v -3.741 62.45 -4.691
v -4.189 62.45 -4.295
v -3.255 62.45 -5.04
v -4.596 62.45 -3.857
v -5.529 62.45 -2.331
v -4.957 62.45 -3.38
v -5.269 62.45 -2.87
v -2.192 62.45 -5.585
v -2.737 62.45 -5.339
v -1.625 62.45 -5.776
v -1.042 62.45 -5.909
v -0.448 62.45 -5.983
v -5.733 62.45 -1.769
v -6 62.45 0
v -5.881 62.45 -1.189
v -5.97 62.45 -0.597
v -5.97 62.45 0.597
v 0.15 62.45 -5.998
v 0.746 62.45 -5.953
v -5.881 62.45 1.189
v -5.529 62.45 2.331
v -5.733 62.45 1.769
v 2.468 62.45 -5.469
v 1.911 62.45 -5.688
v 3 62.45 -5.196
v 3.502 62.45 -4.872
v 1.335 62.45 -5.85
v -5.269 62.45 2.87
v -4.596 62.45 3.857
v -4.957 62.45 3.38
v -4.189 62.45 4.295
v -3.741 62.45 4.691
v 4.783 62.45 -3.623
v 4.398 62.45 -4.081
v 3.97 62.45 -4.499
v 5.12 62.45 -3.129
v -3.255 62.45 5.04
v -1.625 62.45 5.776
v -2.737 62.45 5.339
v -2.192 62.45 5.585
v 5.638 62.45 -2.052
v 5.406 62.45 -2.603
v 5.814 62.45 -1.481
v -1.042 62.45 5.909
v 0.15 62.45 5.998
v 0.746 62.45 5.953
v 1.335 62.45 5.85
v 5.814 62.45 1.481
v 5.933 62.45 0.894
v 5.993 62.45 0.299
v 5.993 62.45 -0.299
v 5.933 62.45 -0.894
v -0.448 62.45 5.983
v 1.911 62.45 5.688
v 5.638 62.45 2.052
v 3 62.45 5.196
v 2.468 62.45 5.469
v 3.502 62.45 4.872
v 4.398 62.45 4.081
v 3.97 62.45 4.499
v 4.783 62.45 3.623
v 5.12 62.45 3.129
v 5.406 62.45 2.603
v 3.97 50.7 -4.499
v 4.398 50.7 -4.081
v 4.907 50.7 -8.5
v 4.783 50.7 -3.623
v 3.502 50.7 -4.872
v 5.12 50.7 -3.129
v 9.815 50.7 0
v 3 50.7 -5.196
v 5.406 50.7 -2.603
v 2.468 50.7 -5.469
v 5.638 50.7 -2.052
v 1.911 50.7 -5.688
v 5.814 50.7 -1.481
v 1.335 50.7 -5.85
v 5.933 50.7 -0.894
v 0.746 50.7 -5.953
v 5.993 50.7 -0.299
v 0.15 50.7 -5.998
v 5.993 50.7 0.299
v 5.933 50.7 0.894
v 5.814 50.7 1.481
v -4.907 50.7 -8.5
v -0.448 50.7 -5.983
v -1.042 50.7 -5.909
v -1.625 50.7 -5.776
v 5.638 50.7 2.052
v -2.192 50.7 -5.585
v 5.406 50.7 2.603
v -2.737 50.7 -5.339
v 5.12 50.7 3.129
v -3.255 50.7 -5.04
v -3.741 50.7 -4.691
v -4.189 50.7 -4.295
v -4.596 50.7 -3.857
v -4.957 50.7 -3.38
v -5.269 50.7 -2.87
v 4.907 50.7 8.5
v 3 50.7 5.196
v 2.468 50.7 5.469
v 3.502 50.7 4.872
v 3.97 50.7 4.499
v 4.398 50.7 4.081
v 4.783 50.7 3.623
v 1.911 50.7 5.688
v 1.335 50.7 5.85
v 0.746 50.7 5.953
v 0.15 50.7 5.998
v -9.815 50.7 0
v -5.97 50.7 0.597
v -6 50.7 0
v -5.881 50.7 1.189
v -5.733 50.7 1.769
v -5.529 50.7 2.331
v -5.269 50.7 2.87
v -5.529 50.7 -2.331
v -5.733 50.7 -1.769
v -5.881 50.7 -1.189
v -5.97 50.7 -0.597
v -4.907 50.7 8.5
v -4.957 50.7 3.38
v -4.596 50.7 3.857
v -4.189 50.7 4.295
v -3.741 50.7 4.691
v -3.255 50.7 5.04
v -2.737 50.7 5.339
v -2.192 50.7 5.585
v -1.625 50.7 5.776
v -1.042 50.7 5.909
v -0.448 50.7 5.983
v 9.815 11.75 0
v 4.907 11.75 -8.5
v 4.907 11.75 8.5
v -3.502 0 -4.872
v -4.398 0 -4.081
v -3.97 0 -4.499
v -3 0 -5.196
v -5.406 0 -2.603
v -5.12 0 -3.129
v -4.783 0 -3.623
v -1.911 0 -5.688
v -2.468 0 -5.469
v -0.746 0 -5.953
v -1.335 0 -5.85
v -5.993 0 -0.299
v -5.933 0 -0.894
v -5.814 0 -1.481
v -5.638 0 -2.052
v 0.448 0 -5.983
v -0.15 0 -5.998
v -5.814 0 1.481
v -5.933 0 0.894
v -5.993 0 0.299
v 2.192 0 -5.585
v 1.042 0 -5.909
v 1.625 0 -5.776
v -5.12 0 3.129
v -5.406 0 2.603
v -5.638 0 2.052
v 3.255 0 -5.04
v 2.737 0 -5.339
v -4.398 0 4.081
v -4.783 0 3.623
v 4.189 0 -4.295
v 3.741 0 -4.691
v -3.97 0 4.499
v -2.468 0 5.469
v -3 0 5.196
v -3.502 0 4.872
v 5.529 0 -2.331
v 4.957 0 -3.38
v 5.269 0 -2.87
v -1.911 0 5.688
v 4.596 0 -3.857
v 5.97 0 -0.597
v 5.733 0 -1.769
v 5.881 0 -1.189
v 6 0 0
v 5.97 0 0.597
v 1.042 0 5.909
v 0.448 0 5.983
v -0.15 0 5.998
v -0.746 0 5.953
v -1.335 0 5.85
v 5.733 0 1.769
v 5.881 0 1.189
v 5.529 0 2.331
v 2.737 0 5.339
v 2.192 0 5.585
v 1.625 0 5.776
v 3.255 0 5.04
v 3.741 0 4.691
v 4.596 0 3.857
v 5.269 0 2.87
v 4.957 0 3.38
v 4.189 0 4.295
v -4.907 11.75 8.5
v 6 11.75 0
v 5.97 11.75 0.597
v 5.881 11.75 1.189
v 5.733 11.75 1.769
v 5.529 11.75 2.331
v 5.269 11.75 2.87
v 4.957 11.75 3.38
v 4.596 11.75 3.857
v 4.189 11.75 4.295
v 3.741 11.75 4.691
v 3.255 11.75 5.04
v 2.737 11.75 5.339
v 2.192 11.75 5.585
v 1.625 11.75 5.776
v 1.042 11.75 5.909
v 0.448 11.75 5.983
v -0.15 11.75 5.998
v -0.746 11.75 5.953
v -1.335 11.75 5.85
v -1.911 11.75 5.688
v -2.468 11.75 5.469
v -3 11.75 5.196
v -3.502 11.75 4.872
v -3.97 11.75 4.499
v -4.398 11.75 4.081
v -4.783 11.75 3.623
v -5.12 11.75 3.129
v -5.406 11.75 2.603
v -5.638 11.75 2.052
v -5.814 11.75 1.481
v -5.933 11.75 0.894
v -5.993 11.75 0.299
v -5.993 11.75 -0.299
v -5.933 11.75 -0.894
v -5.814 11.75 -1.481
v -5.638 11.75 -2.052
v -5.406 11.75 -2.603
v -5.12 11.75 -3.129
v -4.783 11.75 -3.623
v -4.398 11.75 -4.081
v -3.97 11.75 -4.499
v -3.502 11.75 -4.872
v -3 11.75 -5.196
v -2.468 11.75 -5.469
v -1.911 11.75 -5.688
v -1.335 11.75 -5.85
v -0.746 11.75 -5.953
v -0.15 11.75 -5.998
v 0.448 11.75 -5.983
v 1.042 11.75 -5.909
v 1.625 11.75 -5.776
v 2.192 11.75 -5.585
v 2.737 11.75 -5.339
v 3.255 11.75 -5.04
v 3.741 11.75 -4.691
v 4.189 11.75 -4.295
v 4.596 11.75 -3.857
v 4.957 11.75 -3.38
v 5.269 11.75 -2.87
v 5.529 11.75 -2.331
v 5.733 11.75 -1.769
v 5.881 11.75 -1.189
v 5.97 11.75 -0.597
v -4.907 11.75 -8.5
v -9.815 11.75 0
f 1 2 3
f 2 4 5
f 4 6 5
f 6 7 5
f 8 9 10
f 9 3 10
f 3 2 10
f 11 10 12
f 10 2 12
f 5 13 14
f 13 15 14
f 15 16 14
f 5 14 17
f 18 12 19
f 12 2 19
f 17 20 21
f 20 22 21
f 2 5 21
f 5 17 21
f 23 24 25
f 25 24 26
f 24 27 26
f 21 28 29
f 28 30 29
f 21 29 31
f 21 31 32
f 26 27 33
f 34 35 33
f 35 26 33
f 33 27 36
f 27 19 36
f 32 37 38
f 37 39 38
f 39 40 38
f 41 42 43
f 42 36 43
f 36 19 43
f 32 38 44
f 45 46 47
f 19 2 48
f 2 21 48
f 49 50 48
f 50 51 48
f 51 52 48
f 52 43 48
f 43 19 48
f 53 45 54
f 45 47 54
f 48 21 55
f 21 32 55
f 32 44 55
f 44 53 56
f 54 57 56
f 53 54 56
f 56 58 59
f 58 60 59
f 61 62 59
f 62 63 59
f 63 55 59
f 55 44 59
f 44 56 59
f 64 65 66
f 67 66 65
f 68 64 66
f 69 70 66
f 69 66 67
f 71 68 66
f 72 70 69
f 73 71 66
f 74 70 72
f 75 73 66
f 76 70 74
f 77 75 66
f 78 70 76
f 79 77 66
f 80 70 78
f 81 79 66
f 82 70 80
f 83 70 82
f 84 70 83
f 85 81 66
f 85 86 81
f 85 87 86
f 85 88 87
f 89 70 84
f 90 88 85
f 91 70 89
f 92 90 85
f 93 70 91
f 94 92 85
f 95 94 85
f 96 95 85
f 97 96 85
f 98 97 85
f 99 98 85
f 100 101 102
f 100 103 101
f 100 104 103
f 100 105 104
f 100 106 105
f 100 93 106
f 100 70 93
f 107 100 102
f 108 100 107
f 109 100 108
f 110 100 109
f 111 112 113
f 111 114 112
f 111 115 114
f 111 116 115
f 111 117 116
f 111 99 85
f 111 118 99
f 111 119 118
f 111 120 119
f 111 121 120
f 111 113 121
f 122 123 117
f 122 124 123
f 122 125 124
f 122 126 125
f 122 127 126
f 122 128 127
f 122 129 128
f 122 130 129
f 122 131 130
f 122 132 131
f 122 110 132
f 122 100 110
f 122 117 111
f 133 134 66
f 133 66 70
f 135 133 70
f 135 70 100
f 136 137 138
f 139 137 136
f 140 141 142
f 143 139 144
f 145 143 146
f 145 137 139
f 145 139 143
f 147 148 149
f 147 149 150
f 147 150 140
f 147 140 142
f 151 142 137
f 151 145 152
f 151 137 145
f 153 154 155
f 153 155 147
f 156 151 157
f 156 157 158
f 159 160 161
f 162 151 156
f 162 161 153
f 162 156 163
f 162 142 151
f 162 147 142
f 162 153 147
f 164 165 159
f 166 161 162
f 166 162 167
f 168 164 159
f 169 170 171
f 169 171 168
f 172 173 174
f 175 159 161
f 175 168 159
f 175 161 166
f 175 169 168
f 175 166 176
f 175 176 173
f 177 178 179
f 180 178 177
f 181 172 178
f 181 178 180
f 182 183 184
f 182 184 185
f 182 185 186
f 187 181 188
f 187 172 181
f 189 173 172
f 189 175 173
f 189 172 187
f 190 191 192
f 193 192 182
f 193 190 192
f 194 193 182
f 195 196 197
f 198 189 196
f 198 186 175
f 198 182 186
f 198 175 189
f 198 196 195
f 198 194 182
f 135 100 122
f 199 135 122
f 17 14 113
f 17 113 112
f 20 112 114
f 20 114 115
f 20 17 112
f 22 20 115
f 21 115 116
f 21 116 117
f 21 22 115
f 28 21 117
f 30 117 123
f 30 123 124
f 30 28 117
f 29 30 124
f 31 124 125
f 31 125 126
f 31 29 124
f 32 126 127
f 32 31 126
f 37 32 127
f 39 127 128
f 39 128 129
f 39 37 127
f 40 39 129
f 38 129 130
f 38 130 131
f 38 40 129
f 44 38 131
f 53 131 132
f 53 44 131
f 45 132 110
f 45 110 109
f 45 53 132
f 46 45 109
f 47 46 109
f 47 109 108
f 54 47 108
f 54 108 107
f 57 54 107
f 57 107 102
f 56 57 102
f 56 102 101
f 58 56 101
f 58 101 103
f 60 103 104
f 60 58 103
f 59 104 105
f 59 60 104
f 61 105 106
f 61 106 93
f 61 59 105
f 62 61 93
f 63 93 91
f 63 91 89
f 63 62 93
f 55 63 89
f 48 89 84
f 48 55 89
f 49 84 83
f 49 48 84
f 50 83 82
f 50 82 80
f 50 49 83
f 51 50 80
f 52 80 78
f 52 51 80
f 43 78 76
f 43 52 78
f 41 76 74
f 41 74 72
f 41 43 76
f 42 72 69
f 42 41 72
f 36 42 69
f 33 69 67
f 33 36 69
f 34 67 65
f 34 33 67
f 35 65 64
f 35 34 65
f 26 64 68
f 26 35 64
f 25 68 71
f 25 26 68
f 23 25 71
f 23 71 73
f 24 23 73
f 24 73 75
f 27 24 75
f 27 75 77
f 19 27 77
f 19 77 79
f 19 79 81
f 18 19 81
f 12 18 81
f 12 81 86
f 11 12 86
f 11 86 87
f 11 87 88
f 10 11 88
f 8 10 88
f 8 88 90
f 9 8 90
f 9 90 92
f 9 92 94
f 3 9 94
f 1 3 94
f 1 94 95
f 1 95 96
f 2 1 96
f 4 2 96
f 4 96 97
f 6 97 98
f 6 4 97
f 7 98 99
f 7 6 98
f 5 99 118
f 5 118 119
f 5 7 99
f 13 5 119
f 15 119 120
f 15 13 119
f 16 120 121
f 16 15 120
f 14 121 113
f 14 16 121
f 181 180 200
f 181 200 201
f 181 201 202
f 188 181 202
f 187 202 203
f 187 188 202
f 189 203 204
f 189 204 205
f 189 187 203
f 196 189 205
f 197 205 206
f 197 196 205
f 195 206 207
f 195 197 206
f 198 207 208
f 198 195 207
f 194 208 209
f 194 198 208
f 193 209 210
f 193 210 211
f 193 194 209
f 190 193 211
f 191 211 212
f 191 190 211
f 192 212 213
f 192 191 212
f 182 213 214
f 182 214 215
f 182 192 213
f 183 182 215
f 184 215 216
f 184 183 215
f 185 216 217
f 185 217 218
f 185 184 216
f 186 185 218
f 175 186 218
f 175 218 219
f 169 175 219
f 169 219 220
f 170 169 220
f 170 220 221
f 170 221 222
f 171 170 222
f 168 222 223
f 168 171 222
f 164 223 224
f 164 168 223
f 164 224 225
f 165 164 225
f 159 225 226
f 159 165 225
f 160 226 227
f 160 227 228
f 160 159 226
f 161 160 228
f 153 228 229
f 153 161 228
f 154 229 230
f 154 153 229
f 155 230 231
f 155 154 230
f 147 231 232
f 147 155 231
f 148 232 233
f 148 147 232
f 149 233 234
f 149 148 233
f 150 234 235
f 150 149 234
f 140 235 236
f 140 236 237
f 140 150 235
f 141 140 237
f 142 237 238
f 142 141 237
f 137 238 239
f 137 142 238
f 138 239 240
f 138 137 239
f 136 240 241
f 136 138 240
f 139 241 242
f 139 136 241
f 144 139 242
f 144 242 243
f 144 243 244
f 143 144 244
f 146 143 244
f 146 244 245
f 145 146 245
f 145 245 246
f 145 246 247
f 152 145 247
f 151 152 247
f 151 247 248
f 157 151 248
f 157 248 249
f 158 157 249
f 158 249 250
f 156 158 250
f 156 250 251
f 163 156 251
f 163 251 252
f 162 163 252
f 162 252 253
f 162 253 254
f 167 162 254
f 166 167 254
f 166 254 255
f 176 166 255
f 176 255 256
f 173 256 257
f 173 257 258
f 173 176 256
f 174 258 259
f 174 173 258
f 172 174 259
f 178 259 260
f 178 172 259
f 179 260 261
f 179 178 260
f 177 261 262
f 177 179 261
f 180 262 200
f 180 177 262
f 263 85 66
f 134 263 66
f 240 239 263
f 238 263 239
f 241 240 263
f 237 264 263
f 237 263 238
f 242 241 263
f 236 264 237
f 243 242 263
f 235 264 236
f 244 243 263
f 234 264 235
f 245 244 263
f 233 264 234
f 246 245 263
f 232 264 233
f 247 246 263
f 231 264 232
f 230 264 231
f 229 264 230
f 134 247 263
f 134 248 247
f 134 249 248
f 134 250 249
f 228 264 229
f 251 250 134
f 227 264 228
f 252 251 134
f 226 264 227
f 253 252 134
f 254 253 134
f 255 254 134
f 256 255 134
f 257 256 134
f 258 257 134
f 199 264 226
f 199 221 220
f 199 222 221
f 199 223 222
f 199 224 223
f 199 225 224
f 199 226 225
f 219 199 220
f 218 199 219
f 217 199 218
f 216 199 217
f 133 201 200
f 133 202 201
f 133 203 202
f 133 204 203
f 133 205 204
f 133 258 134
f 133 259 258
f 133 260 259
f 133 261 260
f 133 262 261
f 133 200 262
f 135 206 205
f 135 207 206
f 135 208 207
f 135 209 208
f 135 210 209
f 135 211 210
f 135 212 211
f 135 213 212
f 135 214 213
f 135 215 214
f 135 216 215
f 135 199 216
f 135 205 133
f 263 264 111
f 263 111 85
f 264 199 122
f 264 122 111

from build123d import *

# Parameters (mm, degrees)
F1_DEPTH = 62.45
F2_R     = 16.478049
F2_R_2   = 6
F3_DEPTH = 11.75
F4_R     = 15.413294
F4_R_2   = 6
F5_DEPTH = 11.75


with BuildPart() as f1:
    # F0 (on Front) → F1 (new body)
    with BuildSketch(Plane.XZ):
        Polygon((-4.907477, -8.5), (4.907477, -8.5), (9.814955, 0), (4.907477, 8.5), (-4.907477, 8.5), (-9.814955, 0), align=None)
    extrude(amount=-F1_DEPTH)

    # F2 (on face) → F3 (cut)
    with BuildSketch(Plane.XZ):
        Circle(F2_R)
        Circle(F2_R_2, mode=Mode.SUBTRACT)
    extrude(amount=-F3_DEPTH, mode=Mode.SUBTRACT)

    # F4 (on face) → F5 (cut)
    with BuildSketch(Plane(origin=(0, 62.45, 0), x_dir=(-1, 0, 0), z_dir=(0, 1, 0))):
        Circle(F4_R)
        Circle(F4_R_2, mode=Mode.SUBTRACT)
    extrude(amount=-F5_DEPTH, mode=Mode.SUBTRACT)


solid = f1.part
